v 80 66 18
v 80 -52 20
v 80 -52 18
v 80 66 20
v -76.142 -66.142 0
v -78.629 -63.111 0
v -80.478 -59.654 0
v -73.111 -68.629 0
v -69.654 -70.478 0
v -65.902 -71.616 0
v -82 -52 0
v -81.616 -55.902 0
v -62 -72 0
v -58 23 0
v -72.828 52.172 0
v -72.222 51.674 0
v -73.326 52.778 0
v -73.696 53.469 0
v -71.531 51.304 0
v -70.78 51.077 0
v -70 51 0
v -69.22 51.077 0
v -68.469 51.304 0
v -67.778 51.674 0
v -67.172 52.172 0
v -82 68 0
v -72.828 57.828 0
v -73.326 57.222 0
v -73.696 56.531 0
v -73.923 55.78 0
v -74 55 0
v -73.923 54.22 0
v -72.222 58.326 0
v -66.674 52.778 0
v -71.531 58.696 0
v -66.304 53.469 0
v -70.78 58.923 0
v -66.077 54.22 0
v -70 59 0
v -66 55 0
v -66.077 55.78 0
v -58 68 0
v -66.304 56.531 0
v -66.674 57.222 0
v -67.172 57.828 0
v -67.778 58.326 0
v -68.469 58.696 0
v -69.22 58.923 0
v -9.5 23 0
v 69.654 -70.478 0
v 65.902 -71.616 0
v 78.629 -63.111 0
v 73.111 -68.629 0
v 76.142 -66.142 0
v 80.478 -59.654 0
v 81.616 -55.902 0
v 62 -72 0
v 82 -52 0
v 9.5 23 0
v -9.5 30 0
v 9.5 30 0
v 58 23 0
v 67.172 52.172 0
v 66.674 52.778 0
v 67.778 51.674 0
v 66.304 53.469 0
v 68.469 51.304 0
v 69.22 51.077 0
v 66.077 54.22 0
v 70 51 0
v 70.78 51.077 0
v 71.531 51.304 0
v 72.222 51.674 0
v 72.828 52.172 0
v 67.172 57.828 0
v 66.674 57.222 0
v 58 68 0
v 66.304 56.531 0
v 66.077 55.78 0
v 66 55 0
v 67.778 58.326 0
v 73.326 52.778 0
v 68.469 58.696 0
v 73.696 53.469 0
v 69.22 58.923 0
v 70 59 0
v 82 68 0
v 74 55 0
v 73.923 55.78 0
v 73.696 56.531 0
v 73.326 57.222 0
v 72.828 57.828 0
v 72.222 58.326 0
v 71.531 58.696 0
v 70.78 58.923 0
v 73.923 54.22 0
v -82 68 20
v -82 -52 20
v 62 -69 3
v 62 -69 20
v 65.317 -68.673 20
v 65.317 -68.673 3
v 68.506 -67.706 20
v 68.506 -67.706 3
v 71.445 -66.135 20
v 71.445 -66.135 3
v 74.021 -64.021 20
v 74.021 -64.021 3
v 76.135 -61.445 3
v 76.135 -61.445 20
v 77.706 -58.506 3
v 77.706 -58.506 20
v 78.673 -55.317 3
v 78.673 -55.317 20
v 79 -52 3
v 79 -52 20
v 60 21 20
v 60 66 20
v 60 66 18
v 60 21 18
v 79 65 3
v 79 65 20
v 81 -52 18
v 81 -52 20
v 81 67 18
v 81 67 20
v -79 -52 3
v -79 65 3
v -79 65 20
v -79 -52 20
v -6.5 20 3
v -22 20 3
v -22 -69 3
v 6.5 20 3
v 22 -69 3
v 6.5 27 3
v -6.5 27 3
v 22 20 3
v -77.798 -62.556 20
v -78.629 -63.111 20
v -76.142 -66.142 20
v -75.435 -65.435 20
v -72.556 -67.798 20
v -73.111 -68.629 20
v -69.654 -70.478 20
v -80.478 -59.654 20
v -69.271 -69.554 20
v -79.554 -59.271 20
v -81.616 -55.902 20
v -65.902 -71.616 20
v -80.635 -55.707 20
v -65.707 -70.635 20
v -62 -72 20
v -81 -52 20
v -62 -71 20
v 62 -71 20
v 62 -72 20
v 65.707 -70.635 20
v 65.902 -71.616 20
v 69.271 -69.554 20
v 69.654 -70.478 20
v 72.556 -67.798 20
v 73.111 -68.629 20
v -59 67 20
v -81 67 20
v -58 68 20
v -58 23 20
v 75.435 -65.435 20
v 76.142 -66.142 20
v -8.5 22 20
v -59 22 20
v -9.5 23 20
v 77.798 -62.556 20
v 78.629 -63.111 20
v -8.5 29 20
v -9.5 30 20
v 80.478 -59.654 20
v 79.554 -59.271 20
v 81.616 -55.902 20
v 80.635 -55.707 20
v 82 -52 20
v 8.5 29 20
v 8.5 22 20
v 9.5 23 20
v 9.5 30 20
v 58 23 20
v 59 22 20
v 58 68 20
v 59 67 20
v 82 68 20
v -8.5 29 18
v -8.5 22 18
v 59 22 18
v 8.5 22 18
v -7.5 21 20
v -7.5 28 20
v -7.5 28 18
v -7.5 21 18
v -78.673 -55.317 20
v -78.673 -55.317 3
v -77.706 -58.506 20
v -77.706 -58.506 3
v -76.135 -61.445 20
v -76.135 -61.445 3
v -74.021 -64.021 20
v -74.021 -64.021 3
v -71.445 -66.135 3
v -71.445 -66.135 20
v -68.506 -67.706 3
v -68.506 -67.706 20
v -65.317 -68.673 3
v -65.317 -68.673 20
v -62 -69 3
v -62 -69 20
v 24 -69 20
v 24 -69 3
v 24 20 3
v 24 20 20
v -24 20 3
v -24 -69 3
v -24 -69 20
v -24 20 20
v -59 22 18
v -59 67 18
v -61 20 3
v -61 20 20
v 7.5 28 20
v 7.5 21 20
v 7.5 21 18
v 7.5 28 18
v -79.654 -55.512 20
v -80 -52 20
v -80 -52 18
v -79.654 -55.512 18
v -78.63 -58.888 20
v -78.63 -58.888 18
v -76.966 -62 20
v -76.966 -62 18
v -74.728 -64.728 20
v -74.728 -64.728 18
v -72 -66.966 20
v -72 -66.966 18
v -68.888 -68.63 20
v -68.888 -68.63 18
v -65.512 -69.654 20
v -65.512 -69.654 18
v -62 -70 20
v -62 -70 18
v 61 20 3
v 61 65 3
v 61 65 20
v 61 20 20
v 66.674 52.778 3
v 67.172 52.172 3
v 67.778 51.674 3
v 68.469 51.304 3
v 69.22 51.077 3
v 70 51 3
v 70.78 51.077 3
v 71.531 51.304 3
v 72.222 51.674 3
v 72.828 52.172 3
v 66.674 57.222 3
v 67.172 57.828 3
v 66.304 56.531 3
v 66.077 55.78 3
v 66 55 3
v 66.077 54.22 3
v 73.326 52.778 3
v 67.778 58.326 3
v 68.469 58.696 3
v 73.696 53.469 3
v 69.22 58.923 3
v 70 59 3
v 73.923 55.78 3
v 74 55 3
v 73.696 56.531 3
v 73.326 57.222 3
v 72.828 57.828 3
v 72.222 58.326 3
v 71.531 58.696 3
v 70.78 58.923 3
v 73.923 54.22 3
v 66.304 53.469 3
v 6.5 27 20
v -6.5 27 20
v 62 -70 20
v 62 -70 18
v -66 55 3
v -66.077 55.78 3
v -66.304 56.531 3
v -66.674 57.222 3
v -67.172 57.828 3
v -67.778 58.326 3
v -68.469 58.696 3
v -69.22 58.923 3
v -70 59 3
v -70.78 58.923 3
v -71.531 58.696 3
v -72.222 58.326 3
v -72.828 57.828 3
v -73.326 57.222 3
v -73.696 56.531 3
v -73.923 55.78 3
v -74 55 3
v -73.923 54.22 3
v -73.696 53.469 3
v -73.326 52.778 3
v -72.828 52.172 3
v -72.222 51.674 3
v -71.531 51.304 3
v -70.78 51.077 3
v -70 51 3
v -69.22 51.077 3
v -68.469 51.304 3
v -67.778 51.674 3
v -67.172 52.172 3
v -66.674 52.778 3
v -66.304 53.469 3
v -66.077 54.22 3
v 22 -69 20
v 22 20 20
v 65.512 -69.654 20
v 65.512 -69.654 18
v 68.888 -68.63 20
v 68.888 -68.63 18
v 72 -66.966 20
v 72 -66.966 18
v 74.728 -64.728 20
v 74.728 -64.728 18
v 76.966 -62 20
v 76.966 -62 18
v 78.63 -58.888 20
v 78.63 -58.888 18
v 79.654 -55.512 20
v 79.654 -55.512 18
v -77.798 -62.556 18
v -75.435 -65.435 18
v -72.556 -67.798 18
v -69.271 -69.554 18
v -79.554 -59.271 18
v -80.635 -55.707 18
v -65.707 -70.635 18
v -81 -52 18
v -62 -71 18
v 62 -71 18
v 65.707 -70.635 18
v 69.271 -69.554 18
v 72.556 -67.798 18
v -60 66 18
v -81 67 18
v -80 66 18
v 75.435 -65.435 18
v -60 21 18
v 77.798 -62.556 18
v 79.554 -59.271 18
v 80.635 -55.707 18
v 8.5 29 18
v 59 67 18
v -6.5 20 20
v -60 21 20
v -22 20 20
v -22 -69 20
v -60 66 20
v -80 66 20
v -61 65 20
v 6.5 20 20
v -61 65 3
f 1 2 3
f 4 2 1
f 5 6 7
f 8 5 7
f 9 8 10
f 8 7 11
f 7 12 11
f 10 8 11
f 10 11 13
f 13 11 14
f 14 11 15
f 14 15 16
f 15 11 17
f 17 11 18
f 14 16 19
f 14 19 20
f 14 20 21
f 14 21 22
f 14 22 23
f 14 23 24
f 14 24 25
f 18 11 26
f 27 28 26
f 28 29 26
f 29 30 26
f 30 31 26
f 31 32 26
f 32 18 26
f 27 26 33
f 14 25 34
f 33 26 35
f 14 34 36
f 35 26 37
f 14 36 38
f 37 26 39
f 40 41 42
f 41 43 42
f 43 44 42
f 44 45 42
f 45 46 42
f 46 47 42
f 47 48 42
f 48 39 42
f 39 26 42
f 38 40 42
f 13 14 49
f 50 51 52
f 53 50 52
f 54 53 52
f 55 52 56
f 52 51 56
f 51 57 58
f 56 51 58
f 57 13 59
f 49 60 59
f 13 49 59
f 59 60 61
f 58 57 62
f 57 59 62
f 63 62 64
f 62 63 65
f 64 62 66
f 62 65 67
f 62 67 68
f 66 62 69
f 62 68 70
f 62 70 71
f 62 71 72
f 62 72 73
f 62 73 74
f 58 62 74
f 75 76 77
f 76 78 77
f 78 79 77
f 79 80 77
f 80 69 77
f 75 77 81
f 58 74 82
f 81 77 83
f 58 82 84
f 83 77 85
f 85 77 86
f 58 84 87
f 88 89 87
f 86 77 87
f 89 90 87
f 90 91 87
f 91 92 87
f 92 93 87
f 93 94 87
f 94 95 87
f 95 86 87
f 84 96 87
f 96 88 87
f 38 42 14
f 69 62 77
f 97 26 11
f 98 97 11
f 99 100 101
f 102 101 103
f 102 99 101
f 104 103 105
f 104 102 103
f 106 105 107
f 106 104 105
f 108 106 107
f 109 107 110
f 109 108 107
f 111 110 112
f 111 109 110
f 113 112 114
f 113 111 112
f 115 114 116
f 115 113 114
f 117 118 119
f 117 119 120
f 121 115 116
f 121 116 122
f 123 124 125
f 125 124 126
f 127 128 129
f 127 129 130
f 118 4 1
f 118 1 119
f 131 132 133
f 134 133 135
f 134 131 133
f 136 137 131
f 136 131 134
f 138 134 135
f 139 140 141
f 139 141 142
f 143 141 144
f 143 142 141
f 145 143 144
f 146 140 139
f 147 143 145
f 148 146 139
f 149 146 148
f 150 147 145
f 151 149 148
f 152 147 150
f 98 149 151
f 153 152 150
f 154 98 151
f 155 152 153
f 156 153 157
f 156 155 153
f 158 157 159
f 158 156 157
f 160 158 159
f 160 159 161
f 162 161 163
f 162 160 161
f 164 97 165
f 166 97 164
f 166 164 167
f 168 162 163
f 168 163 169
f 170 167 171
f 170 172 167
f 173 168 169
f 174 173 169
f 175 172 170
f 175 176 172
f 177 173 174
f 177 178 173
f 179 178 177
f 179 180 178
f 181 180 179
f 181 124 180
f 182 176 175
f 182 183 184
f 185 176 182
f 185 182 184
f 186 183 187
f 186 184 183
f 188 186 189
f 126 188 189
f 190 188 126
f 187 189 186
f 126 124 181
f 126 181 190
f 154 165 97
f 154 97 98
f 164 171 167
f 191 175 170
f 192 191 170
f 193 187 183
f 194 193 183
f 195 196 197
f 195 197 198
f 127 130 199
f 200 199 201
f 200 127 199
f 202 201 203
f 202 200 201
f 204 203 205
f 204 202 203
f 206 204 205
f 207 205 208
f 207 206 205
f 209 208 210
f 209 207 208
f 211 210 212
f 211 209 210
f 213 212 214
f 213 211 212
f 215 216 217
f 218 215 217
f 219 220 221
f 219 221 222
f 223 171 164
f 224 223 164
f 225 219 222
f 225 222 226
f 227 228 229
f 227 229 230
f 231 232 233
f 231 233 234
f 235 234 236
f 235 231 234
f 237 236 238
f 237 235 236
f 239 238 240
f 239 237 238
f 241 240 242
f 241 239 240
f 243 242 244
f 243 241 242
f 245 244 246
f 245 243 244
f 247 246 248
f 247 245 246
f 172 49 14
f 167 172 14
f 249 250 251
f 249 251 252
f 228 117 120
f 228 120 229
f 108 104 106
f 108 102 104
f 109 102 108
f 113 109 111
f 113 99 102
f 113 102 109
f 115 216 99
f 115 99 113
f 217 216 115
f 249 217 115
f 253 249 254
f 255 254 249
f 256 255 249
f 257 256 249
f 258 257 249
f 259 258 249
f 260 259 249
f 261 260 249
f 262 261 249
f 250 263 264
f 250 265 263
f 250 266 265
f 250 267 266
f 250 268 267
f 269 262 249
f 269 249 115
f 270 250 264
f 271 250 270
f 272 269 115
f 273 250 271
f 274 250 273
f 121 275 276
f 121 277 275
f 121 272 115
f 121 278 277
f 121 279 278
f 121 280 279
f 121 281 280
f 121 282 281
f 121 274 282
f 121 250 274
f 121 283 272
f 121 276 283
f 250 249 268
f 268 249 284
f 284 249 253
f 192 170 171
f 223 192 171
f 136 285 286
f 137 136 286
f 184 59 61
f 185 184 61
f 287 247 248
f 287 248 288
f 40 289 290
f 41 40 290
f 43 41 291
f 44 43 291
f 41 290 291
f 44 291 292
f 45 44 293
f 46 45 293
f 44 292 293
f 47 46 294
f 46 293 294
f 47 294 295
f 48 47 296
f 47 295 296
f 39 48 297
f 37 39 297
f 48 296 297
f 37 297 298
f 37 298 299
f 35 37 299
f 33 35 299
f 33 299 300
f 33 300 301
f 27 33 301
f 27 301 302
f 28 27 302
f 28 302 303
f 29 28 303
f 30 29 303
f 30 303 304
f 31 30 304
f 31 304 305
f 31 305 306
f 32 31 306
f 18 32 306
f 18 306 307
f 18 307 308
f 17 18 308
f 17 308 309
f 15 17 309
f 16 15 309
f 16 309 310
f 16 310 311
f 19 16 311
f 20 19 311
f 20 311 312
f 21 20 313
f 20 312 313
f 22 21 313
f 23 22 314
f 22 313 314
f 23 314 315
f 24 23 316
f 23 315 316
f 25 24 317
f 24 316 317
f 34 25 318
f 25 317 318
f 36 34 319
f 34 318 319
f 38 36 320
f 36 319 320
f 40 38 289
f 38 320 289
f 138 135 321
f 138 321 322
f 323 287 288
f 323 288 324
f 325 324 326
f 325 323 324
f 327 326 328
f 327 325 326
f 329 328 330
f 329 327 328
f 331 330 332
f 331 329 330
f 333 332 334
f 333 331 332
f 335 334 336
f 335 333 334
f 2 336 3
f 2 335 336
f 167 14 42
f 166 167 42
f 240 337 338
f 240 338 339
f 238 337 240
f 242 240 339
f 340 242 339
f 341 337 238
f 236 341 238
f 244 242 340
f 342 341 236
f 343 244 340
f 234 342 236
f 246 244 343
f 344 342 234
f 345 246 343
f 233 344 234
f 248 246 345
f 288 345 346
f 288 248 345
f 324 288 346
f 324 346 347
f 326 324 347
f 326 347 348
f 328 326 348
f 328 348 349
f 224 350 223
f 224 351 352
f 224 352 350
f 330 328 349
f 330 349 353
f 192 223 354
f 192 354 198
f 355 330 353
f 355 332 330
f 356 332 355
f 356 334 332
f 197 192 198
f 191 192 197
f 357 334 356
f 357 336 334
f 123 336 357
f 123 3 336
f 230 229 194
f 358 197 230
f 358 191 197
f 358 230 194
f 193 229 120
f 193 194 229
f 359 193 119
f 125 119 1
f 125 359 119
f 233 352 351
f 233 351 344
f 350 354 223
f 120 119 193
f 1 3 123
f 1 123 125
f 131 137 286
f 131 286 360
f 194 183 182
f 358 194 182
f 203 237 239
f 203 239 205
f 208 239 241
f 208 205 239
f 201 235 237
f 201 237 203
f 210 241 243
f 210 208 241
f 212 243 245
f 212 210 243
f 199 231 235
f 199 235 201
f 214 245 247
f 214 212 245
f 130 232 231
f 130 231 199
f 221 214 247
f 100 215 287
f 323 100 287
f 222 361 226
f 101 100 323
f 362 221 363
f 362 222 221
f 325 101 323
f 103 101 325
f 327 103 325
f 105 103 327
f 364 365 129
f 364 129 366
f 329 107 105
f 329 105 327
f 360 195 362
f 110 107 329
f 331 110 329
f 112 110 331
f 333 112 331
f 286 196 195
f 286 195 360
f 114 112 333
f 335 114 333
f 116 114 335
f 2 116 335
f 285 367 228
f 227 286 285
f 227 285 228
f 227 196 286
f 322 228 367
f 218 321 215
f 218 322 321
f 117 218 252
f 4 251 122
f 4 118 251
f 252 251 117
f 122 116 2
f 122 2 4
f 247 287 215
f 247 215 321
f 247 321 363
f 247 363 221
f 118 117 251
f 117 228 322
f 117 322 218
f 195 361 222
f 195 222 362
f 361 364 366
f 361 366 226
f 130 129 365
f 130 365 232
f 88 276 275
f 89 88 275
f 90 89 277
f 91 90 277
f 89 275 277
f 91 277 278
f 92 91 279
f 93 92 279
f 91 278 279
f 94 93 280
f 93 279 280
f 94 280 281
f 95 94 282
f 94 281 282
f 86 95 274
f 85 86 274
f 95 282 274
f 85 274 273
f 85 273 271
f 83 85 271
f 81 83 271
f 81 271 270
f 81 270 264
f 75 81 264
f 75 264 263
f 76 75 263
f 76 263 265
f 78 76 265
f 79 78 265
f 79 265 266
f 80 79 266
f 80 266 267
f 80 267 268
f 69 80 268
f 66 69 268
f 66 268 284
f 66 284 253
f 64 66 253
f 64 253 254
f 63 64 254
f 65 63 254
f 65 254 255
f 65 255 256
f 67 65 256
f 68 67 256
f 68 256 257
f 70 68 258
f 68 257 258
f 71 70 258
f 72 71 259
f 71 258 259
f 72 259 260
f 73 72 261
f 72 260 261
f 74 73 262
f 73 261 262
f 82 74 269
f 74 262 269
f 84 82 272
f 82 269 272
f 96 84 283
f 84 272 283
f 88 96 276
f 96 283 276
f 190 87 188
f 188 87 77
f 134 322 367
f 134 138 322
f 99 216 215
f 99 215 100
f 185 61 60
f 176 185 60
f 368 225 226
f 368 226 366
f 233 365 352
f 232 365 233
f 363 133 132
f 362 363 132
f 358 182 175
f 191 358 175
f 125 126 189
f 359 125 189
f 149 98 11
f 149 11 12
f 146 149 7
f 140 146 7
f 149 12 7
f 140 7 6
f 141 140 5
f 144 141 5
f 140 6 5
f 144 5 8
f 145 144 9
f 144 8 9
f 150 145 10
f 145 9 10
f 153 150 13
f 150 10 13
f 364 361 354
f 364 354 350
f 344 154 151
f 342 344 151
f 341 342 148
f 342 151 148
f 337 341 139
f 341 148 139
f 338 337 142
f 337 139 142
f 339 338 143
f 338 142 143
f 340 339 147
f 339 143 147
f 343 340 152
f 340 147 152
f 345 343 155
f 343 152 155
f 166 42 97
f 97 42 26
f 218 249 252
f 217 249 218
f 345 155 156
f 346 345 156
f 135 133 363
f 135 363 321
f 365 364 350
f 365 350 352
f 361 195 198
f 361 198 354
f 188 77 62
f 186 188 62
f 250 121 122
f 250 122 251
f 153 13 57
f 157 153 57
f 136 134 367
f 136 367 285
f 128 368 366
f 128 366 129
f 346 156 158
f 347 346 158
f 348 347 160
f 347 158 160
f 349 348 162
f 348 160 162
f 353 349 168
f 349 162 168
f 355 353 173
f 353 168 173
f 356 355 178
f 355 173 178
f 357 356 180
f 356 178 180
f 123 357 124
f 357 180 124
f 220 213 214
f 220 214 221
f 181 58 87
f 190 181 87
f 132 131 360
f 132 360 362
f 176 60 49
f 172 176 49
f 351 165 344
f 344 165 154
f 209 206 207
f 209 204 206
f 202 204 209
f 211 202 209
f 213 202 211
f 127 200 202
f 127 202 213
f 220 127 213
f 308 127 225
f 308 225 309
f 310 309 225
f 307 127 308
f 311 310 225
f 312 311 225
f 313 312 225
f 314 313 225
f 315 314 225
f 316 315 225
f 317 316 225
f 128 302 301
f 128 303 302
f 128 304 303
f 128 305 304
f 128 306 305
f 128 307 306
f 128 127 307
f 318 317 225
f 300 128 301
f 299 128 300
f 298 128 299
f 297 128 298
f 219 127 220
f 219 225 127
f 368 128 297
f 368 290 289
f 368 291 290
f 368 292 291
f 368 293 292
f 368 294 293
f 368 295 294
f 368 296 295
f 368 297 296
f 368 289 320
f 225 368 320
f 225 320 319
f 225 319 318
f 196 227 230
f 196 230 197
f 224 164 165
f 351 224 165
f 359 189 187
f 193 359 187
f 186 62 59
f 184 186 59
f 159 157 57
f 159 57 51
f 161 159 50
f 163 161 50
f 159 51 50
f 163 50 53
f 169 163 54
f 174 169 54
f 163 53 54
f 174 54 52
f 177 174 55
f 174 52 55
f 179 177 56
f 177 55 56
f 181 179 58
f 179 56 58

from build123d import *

# Parameters (mm, degrees)
RESSALTO_EXTRUS_O1_DEPTH = 20
CASCA1_T                 = -3
ESBO_O2_W                = 2
ESBO_O2_H                = 89
RESSALTO_EXTRUS_O2_DEPTH = 17
ESBO_O3_R                = 4
CORTE_EXTRUS_O1_DEPTH    = 111.440028975
ESBO_O4_R                = 4
CORTE_EXTRUS_O2_DEPTH    = 44
CORTE_EXTRUS_O3_DEPTH    = 2


with BuildPart() as part:
    # Esboço1 → Ressalto-extrusão1 (new body)
    with BuildSketch(Plane.XY):
        with BuildLine():
            Line((-58, 23), (-58, 68))
            Line((-58, 68), (-82, 68))
            Line((-82, 68), (-82, -52))
            ThreePointArc((-82, -52), (-76.142135624, -66.142135624), (-62, -72))
            Line((-62, -72), (62, -72))
            ThreePointArc((62, -72), (76.142135624, -66.142135624), (82, -52))
            Line((82, -52), (82, 68))
            Line((82, 68), (58, 68))
            Line((58, 68), (58, 23))
            Line((58, 23), (9.5, 23))
            Line((9.5, 23), (9.5, 30))
            Line((9.5, 30), (-9.5, 30))
            Line((-9.5, 30), (-9.5, 23))
            Line((-9.5, 23), (-58, 23))
        make_face()
    extrude(amount=RESSALTO_EXTRUS_O1_DEPTH)

    # Casca1
    casca1_openings = [part.faces().sort_by_distance(p)[0] for p in [
        (0, -15.157706838, 20),
    ]]
    offset(amount=CASCA1_T, openings=casca1_openings, kind=Kind.INTERSECTION)

    # Esboço2 → Ressalto-extrusão2 (add)
    with BuildSketch(Plane.XY.offset(3)):
        with Locations((-23, -24.5)):
            Rectangle(ESBO_O2_W, ESBO_O2_H)
        with Locations((23, -24.5)):
            Rectangle(ESBO_O2_W, ESBO_O2_H)
    extrude(amount=RESSALTO_EXTRUS_O2_DEPTH)

    # Esboço3 → Corte-extrusão1 (cut, through all)
    with BuildSketch(Plane.XY.offset(3)):
        with Locations((70, 55)):
            Circle(ESBO_O3_R)
    extrude(amount=-CORTE_EXTRUS_O1_DEPTH, mode=Mode.SUBTRACT)

    # Esboço4 → Corte-extrusão2 (cut)
    with BuildSketch(Plane.XY.offset(3)):
        with Locations((-70, 55)):
            Circle(ESBO_O4_R)
    extrude(amount=-CORTE_EXTRUS_O2_DEPTH, mode=Mode.SUBTRACT)

    # Esboço5 → Corte-extrusão3 (cut)
    with BuildSketch(Plane.XY.offset(20)):
        with BuildLine():
            Line((-8.5, 22), (-59, 22))
            Line((-59, 22), (-59, 67))
            Line((-59, 67), (-81, 67))
            Line((-81, 67), (-81, -52))
            ThreePointArc((-81, -52), (-75.435028843, -65.435028843), (-62, -71))
            Line((-62, -71), (62, -71))
            ThreePointArc((62, -71), (75.435028843, -65.435028843), (81, -52))
            Line((81, -52), (81, 67))
            Line((81, 67), (59, 67))
            Line((59, 67), (59, 22))
            Line((59, 22), (8.5, 22))
            Line((8.5, 22), (8.5, 29))
            Line((8.5, 29), (-8.5, 29))
            Line((-8.5, 29), (-8.5, 22))
        make_face()
        with BuildLine():
            Line((-62, -70), (62, -70))
            ThreePointArc((62, -70), (74.727922061, -64.727922061), (80, -52))
            Line((80, -52), (80, 66))
            Line((80, 66), (60, 66))
            Line((60, 66), (60, 21))
            Line((60, 21), (7.5, 21))
            Line((7.5, 21), (7.5, 28))
            Line((7.5, 28), (-7.5, 28))
            Line((-7.5, 28), (-7.5, 21))
            Line((-7.5, 21), (-60, 21))
            Line((-60, 21), (-60, 66))
            Line((-60, 66), (-80, 66))
            Line((-80, 66), (-80, -52))
            ThreePointArc((-80, -52), (-74.727922061, -64.727922061), (-62, -70))
        make_face(mode=Mode.SUBTRACT)
    extrude(amount=-CORTE_EXTRUS_O3_DEPTH, mode=Mode.SUBTRACT)


solid = part.part
